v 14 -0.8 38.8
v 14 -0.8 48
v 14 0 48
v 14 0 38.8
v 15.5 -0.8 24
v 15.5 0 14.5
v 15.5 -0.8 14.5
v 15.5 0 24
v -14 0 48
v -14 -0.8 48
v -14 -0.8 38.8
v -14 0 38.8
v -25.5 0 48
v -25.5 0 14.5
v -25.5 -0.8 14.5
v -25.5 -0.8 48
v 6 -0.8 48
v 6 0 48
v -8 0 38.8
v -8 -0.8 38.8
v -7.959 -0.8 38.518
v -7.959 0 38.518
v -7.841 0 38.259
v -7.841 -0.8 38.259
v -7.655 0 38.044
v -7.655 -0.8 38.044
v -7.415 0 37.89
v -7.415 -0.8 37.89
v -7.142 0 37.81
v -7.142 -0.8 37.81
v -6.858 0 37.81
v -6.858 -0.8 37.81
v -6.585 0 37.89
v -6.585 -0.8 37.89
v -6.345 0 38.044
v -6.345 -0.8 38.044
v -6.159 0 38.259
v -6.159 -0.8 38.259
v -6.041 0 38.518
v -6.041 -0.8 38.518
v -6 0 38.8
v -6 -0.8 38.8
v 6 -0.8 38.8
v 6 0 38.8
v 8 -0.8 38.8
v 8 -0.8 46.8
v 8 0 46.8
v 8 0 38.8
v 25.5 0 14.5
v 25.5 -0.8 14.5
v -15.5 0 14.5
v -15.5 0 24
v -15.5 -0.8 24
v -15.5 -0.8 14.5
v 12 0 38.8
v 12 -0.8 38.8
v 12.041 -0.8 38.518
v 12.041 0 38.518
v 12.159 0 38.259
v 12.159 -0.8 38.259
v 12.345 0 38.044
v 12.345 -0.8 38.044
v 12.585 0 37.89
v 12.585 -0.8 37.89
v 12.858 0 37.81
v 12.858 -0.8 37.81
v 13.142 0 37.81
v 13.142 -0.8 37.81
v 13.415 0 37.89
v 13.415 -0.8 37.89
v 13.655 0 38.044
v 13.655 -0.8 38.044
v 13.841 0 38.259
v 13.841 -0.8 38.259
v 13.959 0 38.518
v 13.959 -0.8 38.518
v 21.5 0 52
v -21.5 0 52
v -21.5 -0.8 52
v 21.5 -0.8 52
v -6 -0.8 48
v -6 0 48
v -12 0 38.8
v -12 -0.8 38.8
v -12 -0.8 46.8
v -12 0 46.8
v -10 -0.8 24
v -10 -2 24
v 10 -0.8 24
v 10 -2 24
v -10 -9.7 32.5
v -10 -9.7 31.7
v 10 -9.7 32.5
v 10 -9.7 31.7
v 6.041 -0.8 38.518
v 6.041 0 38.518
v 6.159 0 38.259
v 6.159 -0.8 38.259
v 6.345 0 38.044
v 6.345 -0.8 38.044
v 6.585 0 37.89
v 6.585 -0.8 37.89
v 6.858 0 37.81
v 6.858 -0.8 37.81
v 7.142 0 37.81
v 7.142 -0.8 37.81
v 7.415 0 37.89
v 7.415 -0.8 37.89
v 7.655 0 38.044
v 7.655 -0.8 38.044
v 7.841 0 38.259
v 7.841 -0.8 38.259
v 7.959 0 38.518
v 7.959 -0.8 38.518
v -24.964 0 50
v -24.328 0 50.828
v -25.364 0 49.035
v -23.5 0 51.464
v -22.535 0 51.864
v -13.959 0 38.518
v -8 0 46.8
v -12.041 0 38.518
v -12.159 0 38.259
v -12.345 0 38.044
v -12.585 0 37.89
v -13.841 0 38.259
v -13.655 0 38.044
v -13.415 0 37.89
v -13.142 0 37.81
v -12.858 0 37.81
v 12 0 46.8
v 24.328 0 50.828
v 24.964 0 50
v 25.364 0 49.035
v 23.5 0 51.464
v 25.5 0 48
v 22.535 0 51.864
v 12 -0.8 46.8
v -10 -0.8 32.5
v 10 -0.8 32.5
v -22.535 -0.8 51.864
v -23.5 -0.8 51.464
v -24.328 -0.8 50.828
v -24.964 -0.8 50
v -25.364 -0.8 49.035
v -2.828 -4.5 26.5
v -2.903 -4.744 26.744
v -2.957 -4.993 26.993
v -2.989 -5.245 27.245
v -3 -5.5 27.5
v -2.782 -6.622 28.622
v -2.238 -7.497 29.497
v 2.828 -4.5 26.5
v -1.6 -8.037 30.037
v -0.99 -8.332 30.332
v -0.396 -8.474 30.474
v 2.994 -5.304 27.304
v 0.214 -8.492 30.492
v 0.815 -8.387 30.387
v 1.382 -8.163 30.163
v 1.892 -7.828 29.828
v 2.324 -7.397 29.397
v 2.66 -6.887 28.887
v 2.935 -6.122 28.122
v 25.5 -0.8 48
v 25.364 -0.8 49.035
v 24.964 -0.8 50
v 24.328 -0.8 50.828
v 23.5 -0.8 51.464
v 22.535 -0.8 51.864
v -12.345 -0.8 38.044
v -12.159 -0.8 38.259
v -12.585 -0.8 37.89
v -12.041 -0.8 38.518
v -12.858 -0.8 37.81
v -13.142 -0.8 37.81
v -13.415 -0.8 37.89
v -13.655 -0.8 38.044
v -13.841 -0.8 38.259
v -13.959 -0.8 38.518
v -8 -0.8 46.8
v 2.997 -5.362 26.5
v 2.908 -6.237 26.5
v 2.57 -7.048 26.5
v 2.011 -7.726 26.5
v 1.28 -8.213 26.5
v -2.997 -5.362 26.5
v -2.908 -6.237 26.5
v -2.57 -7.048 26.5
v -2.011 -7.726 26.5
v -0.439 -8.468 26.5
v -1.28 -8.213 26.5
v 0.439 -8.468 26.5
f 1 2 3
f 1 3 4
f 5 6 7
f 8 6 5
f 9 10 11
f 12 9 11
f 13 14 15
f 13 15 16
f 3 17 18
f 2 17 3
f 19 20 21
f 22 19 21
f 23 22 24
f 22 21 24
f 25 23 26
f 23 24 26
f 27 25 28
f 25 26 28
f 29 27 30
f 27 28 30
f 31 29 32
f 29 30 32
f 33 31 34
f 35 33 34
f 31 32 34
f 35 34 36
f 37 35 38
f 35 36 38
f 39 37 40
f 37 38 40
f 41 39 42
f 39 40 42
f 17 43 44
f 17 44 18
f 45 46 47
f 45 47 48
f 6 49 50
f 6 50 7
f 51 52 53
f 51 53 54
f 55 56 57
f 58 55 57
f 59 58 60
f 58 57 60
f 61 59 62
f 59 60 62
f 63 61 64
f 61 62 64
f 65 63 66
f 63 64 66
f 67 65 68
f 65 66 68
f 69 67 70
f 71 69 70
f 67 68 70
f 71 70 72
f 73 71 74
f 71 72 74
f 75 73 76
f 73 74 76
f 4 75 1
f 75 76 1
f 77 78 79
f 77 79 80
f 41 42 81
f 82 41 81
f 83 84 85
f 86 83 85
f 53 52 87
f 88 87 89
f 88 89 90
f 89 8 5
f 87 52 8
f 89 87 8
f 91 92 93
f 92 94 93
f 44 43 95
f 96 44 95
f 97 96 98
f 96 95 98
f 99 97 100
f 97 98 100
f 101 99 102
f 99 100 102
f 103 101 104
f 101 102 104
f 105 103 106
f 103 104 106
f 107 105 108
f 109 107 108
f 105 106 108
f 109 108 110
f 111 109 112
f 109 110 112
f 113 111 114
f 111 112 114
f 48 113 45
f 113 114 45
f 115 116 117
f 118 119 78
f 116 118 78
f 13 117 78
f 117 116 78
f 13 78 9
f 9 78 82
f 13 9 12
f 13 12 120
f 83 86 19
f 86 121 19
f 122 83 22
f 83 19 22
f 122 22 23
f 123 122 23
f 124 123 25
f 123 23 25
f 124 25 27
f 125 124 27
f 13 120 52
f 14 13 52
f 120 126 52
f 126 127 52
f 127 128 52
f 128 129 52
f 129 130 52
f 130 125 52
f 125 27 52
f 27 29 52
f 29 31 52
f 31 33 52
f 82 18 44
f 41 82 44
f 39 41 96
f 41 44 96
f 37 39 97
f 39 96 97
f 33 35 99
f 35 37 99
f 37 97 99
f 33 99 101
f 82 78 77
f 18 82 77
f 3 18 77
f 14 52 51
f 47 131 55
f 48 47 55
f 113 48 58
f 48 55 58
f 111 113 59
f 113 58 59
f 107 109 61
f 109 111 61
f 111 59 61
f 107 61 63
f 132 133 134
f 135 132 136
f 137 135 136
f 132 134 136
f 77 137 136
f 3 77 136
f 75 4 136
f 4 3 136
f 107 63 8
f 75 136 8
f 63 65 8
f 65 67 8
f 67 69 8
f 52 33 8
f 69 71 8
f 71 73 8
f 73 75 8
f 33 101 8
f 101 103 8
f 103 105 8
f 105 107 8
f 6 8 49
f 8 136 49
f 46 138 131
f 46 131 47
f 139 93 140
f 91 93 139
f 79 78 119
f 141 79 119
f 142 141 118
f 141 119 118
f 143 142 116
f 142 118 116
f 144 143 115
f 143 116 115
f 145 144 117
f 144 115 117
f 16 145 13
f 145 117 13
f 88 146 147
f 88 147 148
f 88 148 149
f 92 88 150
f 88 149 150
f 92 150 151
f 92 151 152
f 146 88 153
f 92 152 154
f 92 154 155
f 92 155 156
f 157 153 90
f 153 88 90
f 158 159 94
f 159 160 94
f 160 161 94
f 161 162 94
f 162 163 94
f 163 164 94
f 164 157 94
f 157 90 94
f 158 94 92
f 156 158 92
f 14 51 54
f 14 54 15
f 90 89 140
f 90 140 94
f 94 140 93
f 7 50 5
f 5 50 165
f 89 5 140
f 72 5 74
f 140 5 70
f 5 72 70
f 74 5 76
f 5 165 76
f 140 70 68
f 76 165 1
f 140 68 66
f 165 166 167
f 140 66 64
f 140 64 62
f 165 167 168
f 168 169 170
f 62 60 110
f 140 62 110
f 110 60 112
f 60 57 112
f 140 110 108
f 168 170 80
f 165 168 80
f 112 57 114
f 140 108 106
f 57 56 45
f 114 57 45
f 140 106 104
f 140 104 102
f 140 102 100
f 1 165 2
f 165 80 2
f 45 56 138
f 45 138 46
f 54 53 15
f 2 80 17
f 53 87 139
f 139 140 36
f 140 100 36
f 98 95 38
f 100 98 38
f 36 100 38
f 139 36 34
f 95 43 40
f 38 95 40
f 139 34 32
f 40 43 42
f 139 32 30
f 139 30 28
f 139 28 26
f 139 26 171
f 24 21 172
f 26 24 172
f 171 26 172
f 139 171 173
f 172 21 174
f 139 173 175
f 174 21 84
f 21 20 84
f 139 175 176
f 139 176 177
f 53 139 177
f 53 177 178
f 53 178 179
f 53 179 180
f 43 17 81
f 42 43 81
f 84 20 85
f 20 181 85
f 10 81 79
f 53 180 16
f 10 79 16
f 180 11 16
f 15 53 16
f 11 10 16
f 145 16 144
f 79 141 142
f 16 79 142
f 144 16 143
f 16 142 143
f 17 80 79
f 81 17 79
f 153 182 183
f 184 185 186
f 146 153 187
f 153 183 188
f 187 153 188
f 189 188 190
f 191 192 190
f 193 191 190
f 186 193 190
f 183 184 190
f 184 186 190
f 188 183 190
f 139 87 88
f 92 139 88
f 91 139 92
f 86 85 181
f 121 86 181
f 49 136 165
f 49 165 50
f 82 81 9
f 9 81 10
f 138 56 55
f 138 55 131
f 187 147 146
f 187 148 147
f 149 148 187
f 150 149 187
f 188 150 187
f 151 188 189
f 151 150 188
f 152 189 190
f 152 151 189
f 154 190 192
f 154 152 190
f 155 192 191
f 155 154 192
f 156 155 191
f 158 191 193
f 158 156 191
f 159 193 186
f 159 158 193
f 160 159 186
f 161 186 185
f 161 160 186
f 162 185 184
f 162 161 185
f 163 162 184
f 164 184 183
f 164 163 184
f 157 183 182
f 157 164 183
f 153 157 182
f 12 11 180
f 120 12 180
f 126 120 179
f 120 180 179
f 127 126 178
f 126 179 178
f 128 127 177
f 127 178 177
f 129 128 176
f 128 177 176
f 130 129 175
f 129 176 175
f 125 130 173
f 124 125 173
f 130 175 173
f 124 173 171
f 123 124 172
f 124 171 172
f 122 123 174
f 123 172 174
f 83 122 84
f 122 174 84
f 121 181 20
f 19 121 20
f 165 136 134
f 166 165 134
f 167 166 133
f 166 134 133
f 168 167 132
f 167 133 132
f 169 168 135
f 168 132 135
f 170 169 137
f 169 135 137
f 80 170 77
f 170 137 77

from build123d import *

# Parameters (mm, degrees)
PAD_DEPTH    = 0.8
PAD001_DEPTH = 10
SKETCH003_R  = 3
PAD002_DEPTH = 6
POCKET_DEPTH = 5


with BuildPart() as part:
    # Sketch → Pad (new body)
    with BuildSketch(Plane.XZ):
        with BuildLine():
            Line((-25.5, 14.5), (-25.5, 48))
            ThreePointArc((-21.5, 52), (-24.328427, 50.828427), (-25.5, 48))
            Line((-21.5, 52), (21.5, 52))
            ThreePointArc((25.5, 48), (24.328427, 50.828427), (21.5, 52))
            Line((25.5, 48), (25.5, 14.5))
            Line((25.5, 14.5), (15.5, 14.5))
            Line((15.5, 14.5), (15.5, 24))
            Line((15.5, 24), (-15.5, 24))
            Line((-15.5, 24), (-15.5, 14.5))
            Line((-15.5, 14.5), (-25.5, 14.5))
        make_face()
    extrude(amount=PAD_DEPTH)

    # Sketch001 → Pad001 (join, symmetric)
    with BuildSketch(Plane.YZ):
        Polygon((-2, 24), (-9.7, 31.7), (-9.7, 32.5), (0, 32.5), (0, 24), align=None)
    extrude(amount=PAD001_DEPTH, both=True)

    # Sketch003 (on Face12 of Pad001) → Pad002 (join)
    with BuildSketch(Plane(origin=(0, 0, 32.5), x_dir=(-1, 0, 0), z_dir=(0, 0, 1))):
        with Locations((0, 5.5)):
            Circle(SKETCH003_R)
    extrude(amount=-PAD002_DEPTH)

    # Sketch004 (on Face5 of Pad002) → Pocket (cut)
    with BuildSketch(Plane.XZ.offset(0.8)):
        with BuildLine():
            Line((-12, 38.8), (-12, 46.8))
            Line((-12, 46.8), (-8, 46.8))
            Line((-8, 46.8), (-8, 38.8))
            ThreePointArc((-8, 38.8), (-7, 37.8), (-6, 38.8))
            Line((-6, 38.8), (-6, 48))
            Line((-6, 48), (-14, 48))
            Line((-14, 48), (-14, 38.8))
            ThreePointArc((-14, 38.8), (-13, 37.8), (-12, 38.8))
        make_face()
        with BuildLine():
            Line((12, 38.8), (12, 46.8))
            Line((12, 46.8), (8, 46.8))
            Line((8, 46.8), (8, 38.8))
            ThreePointArc((6, 38.8), (7, 37.8), (8, 38.8))
            Line((6, 38.8), (6, 48))
            Line((6, 48), (14, 48))
            Line((14, 48), (14, 38.8))
            ThreePointArc((12, 38.8), (13, 37.8), (14, 38.8))
        make_face()
    extrude(amount=-POCKET_DEPTH, mode=Mode.SUBTRACT)


solid = part.part
